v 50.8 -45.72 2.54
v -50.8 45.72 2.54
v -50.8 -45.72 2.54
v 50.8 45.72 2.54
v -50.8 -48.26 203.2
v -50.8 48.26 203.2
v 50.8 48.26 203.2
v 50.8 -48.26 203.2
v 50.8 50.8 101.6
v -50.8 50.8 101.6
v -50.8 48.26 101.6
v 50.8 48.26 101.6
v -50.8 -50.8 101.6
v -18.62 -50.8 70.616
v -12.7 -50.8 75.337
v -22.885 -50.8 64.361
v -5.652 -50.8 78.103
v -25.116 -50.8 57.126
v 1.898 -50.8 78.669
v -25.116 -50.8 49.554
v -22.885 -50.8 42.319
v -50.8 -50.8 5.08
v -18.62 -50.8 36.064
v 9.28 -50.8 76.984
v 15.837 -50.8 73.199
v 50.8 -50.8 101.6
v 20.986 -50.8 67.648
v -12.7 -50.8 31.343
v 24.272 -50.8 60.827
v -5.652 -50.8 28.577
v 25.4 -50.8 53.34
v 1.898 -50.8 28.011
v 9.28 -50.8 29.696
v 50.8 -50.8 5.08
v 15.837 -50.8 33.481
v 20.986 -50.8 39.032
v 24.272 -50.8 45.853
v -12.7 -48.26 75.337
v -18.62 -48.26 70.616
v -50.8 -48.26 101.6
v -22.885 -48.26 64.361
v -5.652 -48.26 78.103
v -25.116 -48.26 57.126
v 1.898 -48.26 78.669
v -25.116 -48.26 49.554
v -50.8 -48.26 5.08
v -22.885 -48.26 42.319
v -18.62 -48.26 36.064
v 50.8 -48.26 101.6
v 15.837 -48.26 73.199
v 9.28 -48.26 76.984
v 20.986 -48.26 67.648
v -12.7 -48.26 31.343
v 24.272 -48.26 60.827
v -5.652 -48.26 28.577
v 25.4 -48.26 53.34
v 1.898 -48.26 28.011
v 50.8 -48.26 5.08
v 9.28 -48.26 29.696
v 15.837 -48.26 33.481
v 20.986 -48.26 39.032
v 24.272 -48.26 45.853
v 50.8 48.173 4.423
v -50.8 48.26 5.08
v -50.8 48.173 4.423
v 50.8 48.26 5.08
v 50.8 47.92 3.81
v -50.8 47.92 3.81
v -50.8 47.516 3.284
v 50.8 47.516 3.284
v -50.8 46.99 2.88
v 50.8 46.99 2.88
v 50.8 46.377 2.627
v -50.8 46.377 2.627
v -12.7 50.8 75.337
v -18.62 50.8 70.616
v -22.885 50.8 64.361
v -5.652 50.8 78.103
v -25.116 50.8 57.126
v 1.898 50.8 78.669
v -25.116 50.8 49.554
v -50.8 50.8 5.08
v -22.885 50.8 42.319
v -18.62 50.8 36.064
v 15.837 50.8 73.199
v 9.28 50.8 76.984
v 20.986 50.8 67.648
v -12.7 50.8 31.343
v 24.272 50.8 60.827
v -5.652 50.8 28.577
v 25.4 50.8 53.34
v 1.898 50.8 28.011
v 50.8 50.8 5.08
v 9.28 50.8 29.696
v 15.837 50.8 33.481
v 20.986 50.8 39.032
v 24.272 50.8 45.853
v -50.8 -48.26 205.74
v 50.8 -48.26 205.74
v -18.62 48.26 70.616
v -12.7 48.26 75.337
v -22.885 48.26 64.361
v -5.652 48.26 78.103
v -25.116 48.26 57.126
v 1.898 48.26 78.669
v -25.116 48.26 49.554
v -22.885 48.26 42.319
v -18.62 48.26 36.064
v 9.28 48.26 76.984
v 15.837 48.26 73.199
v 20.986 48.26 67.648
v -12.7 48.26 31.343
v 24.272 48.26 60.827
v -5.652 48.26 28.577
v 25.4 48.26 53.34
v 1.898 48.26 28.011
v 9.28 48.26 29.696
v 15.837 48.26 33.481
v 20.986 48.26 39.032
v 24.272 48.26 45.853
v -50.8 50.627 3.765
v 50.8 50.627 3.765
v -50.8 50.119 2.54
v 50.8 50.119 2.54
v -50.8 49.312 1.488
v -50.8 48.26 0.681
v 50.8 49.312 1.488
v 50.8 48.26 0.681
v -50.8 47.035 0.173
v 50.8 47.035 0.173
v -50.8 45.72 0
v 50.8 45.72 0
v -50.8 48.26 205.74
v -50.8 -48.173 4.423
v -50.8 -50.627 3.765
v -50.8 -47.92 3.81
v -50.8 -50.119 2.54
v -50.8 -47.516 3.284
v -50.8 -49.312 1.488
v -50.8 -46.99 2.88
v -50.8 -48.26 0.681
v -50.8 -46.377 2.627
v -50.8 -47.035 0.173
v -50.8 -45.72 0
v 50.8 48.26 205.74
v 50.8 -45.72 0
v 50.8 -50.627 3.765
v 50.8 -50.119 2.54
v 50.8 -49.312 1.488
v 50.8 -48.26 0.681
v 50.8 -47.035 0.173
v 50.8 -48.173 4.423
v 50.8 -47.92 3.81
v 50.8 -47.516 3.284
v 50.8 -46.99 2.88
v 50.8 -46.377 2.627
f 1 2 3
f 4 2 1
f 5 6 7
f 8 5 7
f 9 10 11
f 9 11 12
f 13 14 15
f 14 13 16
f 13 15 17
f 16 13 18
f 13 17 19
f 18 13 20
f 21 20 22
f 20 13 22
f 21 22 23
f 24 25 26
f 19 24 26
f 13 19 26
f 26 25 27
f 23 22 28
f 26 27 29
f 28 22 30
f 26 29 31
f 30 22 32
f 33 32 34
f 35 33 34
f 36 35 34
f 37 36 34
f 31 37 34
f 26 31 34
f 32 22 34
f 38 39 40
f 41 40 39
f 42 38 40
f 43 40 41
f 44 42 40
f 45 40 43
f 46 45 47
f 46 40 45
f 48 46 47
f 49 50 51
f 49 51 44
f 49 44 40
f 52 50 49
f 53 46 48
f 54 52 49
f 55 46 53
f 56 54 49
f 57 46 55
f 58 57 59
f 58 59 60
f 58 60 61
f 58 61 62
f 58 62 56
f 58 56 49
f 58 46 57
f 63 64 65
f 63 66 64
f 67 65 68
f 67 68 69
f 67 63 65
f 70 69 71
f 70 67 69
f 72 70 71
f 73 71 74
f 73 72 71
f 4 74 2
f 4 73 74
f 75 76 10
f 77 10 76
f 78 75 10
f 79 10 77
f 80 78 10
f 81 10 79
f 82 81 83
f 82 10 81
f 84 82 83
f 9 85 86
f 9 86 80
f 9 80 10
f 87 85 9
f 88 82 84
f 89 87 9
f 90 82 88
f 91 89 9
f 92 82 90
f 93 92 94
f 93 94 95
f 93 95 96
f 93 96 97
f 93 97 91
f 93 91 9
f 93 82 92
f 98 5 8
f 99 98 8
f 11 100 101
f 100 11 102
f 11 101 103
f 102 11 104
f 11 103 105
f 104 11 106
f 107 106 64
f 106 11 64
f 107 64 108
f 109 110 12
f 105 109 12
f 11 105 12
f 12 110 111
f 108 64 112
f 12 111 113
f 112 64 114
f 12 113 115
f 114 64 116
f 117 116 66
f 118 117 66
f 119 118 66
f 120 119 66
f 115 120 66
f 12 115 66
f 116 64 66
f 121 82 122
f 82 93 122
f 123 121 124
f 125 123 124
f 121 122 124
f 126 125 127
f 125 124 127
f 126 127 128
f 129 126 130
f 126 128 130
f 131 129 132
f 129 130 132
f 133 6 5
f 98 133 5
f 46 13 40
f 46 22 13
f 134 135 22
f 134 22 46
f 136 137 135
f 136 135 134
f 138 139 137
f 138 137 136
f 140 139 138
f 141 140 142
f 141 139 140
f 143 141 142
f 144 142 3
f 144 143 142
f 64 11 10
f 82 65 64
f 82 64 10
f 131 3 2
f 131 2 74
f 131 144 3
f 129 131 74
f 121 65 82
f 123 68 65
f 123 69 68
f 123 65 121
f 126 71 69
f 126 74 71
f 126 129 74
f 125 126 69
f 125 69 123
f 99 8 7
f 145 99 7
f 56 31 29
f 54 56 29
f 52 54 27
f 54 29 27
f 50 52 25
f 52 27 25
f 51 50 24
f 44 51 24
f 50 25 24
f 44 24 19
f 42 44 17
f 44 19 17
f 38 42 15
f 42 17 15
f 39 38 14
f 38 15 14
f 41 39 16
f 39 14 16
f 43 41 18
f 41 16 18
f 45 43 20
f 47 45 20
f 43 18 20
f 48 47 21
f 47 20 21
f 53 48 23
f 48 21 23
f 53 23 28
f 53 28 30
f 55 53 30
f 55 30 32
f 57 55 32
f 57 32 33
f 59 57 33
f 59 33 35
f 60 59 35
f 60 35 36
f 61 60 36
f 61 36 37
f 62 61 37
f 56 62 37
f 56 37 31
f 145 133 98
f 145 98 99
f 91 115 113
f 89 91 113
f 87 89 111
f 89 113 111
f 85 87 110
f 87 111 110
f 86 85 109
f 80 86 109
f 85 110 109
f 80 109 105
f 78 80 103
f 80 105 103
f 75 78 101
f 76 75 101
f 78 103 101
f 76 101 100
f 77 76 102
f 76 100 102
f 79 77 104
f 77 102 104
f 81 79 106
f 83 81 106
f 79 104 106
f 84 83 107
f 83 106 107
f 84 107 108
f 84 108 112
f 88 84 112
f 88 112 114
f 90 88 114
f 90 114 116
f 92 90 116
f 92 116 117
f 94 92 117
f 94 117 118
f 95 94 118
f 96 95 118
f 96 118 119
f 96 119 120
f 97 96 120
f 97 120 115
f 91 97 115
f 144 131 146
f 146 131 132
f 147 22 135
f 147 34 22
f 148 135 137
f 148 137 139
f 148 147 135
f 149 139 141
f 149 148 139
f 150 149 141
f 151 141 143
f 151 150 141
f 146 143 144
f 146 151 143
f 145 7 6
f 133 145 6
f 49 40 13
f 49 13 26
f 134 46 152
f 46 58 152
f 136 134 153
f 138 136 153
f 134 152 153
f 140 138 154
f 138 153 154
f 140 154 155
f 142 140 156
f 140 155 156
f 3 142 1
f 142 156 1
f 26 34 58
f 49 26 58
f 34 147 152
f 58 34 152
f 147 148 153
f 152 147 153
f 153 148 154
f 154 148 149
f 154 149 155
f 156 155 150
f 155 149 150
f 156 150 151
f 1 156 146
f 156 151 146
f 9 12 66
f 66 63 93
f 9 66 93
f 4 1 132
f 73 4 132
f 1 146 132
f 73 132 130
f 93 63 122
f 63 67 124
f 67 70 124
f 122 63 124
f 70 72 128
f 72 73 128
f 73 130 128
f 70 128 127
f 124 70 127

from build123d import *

# Parameters (mm, degrees)
F0_W     = 101.6
F0_H     = 101.6
F1_DEPTH = 101.6
F2_R     = 5.08
F3_T     = -2.54
F4_R     = 25.4
F5_DEPTH = 101.601
F8_DEPTH = 2.54


with BuildPart() as f1:
    # F0 (on Top) → F1 (new body)
    with BuildSketch(Plane.XY):
        Rectangle(F0_W, F0_H)
    extrude(amount=F1_DEPTH)

    # F2
    f2_edges = [f1.edges().sort_by_distance(p)[0] for p in [
        (0, -50.8, 0),
        (0, 50.8, 0),
    ]]
    fillet(f2_edges, radius=F2_R)

    # F3
    f3_openings = [f1.faces().sort_by_distance(p)[0] for p in [
        (0, 0, 101.6),
        (-50.8, 0, 50.853349),
        (50.8, 0, 50.853349),
    ]]
    offset(amount=F3_T, openings=f3_openings)

    # F4 (on face) → F5 (cut, through all)
    with BuildSketch(Plane.XZ.offset(50.8)):
        with Locations((0, 53.34)):
            Circle(F4_R)
    extrude(amount=-F5_DEPTH, mode=Mode.SUBTRACT)


with BuildPart() as f8:
    # F7 (on offset) → F8 (new body)
    with BuildSketch(Plane.XY.offset(203.2)):
        Polygon((-50.8, 48.26), (-50.8, 45.72), (-50.8, -45.72), (-50.8, -48.26), (50.8, -48.26), (50.8, -45.72), (50.8, 45.72), (50.8, 48.26), align=None)
    extrude(amount=F8_DEPTH)


solid = Compound([f1.part, f8.part])
